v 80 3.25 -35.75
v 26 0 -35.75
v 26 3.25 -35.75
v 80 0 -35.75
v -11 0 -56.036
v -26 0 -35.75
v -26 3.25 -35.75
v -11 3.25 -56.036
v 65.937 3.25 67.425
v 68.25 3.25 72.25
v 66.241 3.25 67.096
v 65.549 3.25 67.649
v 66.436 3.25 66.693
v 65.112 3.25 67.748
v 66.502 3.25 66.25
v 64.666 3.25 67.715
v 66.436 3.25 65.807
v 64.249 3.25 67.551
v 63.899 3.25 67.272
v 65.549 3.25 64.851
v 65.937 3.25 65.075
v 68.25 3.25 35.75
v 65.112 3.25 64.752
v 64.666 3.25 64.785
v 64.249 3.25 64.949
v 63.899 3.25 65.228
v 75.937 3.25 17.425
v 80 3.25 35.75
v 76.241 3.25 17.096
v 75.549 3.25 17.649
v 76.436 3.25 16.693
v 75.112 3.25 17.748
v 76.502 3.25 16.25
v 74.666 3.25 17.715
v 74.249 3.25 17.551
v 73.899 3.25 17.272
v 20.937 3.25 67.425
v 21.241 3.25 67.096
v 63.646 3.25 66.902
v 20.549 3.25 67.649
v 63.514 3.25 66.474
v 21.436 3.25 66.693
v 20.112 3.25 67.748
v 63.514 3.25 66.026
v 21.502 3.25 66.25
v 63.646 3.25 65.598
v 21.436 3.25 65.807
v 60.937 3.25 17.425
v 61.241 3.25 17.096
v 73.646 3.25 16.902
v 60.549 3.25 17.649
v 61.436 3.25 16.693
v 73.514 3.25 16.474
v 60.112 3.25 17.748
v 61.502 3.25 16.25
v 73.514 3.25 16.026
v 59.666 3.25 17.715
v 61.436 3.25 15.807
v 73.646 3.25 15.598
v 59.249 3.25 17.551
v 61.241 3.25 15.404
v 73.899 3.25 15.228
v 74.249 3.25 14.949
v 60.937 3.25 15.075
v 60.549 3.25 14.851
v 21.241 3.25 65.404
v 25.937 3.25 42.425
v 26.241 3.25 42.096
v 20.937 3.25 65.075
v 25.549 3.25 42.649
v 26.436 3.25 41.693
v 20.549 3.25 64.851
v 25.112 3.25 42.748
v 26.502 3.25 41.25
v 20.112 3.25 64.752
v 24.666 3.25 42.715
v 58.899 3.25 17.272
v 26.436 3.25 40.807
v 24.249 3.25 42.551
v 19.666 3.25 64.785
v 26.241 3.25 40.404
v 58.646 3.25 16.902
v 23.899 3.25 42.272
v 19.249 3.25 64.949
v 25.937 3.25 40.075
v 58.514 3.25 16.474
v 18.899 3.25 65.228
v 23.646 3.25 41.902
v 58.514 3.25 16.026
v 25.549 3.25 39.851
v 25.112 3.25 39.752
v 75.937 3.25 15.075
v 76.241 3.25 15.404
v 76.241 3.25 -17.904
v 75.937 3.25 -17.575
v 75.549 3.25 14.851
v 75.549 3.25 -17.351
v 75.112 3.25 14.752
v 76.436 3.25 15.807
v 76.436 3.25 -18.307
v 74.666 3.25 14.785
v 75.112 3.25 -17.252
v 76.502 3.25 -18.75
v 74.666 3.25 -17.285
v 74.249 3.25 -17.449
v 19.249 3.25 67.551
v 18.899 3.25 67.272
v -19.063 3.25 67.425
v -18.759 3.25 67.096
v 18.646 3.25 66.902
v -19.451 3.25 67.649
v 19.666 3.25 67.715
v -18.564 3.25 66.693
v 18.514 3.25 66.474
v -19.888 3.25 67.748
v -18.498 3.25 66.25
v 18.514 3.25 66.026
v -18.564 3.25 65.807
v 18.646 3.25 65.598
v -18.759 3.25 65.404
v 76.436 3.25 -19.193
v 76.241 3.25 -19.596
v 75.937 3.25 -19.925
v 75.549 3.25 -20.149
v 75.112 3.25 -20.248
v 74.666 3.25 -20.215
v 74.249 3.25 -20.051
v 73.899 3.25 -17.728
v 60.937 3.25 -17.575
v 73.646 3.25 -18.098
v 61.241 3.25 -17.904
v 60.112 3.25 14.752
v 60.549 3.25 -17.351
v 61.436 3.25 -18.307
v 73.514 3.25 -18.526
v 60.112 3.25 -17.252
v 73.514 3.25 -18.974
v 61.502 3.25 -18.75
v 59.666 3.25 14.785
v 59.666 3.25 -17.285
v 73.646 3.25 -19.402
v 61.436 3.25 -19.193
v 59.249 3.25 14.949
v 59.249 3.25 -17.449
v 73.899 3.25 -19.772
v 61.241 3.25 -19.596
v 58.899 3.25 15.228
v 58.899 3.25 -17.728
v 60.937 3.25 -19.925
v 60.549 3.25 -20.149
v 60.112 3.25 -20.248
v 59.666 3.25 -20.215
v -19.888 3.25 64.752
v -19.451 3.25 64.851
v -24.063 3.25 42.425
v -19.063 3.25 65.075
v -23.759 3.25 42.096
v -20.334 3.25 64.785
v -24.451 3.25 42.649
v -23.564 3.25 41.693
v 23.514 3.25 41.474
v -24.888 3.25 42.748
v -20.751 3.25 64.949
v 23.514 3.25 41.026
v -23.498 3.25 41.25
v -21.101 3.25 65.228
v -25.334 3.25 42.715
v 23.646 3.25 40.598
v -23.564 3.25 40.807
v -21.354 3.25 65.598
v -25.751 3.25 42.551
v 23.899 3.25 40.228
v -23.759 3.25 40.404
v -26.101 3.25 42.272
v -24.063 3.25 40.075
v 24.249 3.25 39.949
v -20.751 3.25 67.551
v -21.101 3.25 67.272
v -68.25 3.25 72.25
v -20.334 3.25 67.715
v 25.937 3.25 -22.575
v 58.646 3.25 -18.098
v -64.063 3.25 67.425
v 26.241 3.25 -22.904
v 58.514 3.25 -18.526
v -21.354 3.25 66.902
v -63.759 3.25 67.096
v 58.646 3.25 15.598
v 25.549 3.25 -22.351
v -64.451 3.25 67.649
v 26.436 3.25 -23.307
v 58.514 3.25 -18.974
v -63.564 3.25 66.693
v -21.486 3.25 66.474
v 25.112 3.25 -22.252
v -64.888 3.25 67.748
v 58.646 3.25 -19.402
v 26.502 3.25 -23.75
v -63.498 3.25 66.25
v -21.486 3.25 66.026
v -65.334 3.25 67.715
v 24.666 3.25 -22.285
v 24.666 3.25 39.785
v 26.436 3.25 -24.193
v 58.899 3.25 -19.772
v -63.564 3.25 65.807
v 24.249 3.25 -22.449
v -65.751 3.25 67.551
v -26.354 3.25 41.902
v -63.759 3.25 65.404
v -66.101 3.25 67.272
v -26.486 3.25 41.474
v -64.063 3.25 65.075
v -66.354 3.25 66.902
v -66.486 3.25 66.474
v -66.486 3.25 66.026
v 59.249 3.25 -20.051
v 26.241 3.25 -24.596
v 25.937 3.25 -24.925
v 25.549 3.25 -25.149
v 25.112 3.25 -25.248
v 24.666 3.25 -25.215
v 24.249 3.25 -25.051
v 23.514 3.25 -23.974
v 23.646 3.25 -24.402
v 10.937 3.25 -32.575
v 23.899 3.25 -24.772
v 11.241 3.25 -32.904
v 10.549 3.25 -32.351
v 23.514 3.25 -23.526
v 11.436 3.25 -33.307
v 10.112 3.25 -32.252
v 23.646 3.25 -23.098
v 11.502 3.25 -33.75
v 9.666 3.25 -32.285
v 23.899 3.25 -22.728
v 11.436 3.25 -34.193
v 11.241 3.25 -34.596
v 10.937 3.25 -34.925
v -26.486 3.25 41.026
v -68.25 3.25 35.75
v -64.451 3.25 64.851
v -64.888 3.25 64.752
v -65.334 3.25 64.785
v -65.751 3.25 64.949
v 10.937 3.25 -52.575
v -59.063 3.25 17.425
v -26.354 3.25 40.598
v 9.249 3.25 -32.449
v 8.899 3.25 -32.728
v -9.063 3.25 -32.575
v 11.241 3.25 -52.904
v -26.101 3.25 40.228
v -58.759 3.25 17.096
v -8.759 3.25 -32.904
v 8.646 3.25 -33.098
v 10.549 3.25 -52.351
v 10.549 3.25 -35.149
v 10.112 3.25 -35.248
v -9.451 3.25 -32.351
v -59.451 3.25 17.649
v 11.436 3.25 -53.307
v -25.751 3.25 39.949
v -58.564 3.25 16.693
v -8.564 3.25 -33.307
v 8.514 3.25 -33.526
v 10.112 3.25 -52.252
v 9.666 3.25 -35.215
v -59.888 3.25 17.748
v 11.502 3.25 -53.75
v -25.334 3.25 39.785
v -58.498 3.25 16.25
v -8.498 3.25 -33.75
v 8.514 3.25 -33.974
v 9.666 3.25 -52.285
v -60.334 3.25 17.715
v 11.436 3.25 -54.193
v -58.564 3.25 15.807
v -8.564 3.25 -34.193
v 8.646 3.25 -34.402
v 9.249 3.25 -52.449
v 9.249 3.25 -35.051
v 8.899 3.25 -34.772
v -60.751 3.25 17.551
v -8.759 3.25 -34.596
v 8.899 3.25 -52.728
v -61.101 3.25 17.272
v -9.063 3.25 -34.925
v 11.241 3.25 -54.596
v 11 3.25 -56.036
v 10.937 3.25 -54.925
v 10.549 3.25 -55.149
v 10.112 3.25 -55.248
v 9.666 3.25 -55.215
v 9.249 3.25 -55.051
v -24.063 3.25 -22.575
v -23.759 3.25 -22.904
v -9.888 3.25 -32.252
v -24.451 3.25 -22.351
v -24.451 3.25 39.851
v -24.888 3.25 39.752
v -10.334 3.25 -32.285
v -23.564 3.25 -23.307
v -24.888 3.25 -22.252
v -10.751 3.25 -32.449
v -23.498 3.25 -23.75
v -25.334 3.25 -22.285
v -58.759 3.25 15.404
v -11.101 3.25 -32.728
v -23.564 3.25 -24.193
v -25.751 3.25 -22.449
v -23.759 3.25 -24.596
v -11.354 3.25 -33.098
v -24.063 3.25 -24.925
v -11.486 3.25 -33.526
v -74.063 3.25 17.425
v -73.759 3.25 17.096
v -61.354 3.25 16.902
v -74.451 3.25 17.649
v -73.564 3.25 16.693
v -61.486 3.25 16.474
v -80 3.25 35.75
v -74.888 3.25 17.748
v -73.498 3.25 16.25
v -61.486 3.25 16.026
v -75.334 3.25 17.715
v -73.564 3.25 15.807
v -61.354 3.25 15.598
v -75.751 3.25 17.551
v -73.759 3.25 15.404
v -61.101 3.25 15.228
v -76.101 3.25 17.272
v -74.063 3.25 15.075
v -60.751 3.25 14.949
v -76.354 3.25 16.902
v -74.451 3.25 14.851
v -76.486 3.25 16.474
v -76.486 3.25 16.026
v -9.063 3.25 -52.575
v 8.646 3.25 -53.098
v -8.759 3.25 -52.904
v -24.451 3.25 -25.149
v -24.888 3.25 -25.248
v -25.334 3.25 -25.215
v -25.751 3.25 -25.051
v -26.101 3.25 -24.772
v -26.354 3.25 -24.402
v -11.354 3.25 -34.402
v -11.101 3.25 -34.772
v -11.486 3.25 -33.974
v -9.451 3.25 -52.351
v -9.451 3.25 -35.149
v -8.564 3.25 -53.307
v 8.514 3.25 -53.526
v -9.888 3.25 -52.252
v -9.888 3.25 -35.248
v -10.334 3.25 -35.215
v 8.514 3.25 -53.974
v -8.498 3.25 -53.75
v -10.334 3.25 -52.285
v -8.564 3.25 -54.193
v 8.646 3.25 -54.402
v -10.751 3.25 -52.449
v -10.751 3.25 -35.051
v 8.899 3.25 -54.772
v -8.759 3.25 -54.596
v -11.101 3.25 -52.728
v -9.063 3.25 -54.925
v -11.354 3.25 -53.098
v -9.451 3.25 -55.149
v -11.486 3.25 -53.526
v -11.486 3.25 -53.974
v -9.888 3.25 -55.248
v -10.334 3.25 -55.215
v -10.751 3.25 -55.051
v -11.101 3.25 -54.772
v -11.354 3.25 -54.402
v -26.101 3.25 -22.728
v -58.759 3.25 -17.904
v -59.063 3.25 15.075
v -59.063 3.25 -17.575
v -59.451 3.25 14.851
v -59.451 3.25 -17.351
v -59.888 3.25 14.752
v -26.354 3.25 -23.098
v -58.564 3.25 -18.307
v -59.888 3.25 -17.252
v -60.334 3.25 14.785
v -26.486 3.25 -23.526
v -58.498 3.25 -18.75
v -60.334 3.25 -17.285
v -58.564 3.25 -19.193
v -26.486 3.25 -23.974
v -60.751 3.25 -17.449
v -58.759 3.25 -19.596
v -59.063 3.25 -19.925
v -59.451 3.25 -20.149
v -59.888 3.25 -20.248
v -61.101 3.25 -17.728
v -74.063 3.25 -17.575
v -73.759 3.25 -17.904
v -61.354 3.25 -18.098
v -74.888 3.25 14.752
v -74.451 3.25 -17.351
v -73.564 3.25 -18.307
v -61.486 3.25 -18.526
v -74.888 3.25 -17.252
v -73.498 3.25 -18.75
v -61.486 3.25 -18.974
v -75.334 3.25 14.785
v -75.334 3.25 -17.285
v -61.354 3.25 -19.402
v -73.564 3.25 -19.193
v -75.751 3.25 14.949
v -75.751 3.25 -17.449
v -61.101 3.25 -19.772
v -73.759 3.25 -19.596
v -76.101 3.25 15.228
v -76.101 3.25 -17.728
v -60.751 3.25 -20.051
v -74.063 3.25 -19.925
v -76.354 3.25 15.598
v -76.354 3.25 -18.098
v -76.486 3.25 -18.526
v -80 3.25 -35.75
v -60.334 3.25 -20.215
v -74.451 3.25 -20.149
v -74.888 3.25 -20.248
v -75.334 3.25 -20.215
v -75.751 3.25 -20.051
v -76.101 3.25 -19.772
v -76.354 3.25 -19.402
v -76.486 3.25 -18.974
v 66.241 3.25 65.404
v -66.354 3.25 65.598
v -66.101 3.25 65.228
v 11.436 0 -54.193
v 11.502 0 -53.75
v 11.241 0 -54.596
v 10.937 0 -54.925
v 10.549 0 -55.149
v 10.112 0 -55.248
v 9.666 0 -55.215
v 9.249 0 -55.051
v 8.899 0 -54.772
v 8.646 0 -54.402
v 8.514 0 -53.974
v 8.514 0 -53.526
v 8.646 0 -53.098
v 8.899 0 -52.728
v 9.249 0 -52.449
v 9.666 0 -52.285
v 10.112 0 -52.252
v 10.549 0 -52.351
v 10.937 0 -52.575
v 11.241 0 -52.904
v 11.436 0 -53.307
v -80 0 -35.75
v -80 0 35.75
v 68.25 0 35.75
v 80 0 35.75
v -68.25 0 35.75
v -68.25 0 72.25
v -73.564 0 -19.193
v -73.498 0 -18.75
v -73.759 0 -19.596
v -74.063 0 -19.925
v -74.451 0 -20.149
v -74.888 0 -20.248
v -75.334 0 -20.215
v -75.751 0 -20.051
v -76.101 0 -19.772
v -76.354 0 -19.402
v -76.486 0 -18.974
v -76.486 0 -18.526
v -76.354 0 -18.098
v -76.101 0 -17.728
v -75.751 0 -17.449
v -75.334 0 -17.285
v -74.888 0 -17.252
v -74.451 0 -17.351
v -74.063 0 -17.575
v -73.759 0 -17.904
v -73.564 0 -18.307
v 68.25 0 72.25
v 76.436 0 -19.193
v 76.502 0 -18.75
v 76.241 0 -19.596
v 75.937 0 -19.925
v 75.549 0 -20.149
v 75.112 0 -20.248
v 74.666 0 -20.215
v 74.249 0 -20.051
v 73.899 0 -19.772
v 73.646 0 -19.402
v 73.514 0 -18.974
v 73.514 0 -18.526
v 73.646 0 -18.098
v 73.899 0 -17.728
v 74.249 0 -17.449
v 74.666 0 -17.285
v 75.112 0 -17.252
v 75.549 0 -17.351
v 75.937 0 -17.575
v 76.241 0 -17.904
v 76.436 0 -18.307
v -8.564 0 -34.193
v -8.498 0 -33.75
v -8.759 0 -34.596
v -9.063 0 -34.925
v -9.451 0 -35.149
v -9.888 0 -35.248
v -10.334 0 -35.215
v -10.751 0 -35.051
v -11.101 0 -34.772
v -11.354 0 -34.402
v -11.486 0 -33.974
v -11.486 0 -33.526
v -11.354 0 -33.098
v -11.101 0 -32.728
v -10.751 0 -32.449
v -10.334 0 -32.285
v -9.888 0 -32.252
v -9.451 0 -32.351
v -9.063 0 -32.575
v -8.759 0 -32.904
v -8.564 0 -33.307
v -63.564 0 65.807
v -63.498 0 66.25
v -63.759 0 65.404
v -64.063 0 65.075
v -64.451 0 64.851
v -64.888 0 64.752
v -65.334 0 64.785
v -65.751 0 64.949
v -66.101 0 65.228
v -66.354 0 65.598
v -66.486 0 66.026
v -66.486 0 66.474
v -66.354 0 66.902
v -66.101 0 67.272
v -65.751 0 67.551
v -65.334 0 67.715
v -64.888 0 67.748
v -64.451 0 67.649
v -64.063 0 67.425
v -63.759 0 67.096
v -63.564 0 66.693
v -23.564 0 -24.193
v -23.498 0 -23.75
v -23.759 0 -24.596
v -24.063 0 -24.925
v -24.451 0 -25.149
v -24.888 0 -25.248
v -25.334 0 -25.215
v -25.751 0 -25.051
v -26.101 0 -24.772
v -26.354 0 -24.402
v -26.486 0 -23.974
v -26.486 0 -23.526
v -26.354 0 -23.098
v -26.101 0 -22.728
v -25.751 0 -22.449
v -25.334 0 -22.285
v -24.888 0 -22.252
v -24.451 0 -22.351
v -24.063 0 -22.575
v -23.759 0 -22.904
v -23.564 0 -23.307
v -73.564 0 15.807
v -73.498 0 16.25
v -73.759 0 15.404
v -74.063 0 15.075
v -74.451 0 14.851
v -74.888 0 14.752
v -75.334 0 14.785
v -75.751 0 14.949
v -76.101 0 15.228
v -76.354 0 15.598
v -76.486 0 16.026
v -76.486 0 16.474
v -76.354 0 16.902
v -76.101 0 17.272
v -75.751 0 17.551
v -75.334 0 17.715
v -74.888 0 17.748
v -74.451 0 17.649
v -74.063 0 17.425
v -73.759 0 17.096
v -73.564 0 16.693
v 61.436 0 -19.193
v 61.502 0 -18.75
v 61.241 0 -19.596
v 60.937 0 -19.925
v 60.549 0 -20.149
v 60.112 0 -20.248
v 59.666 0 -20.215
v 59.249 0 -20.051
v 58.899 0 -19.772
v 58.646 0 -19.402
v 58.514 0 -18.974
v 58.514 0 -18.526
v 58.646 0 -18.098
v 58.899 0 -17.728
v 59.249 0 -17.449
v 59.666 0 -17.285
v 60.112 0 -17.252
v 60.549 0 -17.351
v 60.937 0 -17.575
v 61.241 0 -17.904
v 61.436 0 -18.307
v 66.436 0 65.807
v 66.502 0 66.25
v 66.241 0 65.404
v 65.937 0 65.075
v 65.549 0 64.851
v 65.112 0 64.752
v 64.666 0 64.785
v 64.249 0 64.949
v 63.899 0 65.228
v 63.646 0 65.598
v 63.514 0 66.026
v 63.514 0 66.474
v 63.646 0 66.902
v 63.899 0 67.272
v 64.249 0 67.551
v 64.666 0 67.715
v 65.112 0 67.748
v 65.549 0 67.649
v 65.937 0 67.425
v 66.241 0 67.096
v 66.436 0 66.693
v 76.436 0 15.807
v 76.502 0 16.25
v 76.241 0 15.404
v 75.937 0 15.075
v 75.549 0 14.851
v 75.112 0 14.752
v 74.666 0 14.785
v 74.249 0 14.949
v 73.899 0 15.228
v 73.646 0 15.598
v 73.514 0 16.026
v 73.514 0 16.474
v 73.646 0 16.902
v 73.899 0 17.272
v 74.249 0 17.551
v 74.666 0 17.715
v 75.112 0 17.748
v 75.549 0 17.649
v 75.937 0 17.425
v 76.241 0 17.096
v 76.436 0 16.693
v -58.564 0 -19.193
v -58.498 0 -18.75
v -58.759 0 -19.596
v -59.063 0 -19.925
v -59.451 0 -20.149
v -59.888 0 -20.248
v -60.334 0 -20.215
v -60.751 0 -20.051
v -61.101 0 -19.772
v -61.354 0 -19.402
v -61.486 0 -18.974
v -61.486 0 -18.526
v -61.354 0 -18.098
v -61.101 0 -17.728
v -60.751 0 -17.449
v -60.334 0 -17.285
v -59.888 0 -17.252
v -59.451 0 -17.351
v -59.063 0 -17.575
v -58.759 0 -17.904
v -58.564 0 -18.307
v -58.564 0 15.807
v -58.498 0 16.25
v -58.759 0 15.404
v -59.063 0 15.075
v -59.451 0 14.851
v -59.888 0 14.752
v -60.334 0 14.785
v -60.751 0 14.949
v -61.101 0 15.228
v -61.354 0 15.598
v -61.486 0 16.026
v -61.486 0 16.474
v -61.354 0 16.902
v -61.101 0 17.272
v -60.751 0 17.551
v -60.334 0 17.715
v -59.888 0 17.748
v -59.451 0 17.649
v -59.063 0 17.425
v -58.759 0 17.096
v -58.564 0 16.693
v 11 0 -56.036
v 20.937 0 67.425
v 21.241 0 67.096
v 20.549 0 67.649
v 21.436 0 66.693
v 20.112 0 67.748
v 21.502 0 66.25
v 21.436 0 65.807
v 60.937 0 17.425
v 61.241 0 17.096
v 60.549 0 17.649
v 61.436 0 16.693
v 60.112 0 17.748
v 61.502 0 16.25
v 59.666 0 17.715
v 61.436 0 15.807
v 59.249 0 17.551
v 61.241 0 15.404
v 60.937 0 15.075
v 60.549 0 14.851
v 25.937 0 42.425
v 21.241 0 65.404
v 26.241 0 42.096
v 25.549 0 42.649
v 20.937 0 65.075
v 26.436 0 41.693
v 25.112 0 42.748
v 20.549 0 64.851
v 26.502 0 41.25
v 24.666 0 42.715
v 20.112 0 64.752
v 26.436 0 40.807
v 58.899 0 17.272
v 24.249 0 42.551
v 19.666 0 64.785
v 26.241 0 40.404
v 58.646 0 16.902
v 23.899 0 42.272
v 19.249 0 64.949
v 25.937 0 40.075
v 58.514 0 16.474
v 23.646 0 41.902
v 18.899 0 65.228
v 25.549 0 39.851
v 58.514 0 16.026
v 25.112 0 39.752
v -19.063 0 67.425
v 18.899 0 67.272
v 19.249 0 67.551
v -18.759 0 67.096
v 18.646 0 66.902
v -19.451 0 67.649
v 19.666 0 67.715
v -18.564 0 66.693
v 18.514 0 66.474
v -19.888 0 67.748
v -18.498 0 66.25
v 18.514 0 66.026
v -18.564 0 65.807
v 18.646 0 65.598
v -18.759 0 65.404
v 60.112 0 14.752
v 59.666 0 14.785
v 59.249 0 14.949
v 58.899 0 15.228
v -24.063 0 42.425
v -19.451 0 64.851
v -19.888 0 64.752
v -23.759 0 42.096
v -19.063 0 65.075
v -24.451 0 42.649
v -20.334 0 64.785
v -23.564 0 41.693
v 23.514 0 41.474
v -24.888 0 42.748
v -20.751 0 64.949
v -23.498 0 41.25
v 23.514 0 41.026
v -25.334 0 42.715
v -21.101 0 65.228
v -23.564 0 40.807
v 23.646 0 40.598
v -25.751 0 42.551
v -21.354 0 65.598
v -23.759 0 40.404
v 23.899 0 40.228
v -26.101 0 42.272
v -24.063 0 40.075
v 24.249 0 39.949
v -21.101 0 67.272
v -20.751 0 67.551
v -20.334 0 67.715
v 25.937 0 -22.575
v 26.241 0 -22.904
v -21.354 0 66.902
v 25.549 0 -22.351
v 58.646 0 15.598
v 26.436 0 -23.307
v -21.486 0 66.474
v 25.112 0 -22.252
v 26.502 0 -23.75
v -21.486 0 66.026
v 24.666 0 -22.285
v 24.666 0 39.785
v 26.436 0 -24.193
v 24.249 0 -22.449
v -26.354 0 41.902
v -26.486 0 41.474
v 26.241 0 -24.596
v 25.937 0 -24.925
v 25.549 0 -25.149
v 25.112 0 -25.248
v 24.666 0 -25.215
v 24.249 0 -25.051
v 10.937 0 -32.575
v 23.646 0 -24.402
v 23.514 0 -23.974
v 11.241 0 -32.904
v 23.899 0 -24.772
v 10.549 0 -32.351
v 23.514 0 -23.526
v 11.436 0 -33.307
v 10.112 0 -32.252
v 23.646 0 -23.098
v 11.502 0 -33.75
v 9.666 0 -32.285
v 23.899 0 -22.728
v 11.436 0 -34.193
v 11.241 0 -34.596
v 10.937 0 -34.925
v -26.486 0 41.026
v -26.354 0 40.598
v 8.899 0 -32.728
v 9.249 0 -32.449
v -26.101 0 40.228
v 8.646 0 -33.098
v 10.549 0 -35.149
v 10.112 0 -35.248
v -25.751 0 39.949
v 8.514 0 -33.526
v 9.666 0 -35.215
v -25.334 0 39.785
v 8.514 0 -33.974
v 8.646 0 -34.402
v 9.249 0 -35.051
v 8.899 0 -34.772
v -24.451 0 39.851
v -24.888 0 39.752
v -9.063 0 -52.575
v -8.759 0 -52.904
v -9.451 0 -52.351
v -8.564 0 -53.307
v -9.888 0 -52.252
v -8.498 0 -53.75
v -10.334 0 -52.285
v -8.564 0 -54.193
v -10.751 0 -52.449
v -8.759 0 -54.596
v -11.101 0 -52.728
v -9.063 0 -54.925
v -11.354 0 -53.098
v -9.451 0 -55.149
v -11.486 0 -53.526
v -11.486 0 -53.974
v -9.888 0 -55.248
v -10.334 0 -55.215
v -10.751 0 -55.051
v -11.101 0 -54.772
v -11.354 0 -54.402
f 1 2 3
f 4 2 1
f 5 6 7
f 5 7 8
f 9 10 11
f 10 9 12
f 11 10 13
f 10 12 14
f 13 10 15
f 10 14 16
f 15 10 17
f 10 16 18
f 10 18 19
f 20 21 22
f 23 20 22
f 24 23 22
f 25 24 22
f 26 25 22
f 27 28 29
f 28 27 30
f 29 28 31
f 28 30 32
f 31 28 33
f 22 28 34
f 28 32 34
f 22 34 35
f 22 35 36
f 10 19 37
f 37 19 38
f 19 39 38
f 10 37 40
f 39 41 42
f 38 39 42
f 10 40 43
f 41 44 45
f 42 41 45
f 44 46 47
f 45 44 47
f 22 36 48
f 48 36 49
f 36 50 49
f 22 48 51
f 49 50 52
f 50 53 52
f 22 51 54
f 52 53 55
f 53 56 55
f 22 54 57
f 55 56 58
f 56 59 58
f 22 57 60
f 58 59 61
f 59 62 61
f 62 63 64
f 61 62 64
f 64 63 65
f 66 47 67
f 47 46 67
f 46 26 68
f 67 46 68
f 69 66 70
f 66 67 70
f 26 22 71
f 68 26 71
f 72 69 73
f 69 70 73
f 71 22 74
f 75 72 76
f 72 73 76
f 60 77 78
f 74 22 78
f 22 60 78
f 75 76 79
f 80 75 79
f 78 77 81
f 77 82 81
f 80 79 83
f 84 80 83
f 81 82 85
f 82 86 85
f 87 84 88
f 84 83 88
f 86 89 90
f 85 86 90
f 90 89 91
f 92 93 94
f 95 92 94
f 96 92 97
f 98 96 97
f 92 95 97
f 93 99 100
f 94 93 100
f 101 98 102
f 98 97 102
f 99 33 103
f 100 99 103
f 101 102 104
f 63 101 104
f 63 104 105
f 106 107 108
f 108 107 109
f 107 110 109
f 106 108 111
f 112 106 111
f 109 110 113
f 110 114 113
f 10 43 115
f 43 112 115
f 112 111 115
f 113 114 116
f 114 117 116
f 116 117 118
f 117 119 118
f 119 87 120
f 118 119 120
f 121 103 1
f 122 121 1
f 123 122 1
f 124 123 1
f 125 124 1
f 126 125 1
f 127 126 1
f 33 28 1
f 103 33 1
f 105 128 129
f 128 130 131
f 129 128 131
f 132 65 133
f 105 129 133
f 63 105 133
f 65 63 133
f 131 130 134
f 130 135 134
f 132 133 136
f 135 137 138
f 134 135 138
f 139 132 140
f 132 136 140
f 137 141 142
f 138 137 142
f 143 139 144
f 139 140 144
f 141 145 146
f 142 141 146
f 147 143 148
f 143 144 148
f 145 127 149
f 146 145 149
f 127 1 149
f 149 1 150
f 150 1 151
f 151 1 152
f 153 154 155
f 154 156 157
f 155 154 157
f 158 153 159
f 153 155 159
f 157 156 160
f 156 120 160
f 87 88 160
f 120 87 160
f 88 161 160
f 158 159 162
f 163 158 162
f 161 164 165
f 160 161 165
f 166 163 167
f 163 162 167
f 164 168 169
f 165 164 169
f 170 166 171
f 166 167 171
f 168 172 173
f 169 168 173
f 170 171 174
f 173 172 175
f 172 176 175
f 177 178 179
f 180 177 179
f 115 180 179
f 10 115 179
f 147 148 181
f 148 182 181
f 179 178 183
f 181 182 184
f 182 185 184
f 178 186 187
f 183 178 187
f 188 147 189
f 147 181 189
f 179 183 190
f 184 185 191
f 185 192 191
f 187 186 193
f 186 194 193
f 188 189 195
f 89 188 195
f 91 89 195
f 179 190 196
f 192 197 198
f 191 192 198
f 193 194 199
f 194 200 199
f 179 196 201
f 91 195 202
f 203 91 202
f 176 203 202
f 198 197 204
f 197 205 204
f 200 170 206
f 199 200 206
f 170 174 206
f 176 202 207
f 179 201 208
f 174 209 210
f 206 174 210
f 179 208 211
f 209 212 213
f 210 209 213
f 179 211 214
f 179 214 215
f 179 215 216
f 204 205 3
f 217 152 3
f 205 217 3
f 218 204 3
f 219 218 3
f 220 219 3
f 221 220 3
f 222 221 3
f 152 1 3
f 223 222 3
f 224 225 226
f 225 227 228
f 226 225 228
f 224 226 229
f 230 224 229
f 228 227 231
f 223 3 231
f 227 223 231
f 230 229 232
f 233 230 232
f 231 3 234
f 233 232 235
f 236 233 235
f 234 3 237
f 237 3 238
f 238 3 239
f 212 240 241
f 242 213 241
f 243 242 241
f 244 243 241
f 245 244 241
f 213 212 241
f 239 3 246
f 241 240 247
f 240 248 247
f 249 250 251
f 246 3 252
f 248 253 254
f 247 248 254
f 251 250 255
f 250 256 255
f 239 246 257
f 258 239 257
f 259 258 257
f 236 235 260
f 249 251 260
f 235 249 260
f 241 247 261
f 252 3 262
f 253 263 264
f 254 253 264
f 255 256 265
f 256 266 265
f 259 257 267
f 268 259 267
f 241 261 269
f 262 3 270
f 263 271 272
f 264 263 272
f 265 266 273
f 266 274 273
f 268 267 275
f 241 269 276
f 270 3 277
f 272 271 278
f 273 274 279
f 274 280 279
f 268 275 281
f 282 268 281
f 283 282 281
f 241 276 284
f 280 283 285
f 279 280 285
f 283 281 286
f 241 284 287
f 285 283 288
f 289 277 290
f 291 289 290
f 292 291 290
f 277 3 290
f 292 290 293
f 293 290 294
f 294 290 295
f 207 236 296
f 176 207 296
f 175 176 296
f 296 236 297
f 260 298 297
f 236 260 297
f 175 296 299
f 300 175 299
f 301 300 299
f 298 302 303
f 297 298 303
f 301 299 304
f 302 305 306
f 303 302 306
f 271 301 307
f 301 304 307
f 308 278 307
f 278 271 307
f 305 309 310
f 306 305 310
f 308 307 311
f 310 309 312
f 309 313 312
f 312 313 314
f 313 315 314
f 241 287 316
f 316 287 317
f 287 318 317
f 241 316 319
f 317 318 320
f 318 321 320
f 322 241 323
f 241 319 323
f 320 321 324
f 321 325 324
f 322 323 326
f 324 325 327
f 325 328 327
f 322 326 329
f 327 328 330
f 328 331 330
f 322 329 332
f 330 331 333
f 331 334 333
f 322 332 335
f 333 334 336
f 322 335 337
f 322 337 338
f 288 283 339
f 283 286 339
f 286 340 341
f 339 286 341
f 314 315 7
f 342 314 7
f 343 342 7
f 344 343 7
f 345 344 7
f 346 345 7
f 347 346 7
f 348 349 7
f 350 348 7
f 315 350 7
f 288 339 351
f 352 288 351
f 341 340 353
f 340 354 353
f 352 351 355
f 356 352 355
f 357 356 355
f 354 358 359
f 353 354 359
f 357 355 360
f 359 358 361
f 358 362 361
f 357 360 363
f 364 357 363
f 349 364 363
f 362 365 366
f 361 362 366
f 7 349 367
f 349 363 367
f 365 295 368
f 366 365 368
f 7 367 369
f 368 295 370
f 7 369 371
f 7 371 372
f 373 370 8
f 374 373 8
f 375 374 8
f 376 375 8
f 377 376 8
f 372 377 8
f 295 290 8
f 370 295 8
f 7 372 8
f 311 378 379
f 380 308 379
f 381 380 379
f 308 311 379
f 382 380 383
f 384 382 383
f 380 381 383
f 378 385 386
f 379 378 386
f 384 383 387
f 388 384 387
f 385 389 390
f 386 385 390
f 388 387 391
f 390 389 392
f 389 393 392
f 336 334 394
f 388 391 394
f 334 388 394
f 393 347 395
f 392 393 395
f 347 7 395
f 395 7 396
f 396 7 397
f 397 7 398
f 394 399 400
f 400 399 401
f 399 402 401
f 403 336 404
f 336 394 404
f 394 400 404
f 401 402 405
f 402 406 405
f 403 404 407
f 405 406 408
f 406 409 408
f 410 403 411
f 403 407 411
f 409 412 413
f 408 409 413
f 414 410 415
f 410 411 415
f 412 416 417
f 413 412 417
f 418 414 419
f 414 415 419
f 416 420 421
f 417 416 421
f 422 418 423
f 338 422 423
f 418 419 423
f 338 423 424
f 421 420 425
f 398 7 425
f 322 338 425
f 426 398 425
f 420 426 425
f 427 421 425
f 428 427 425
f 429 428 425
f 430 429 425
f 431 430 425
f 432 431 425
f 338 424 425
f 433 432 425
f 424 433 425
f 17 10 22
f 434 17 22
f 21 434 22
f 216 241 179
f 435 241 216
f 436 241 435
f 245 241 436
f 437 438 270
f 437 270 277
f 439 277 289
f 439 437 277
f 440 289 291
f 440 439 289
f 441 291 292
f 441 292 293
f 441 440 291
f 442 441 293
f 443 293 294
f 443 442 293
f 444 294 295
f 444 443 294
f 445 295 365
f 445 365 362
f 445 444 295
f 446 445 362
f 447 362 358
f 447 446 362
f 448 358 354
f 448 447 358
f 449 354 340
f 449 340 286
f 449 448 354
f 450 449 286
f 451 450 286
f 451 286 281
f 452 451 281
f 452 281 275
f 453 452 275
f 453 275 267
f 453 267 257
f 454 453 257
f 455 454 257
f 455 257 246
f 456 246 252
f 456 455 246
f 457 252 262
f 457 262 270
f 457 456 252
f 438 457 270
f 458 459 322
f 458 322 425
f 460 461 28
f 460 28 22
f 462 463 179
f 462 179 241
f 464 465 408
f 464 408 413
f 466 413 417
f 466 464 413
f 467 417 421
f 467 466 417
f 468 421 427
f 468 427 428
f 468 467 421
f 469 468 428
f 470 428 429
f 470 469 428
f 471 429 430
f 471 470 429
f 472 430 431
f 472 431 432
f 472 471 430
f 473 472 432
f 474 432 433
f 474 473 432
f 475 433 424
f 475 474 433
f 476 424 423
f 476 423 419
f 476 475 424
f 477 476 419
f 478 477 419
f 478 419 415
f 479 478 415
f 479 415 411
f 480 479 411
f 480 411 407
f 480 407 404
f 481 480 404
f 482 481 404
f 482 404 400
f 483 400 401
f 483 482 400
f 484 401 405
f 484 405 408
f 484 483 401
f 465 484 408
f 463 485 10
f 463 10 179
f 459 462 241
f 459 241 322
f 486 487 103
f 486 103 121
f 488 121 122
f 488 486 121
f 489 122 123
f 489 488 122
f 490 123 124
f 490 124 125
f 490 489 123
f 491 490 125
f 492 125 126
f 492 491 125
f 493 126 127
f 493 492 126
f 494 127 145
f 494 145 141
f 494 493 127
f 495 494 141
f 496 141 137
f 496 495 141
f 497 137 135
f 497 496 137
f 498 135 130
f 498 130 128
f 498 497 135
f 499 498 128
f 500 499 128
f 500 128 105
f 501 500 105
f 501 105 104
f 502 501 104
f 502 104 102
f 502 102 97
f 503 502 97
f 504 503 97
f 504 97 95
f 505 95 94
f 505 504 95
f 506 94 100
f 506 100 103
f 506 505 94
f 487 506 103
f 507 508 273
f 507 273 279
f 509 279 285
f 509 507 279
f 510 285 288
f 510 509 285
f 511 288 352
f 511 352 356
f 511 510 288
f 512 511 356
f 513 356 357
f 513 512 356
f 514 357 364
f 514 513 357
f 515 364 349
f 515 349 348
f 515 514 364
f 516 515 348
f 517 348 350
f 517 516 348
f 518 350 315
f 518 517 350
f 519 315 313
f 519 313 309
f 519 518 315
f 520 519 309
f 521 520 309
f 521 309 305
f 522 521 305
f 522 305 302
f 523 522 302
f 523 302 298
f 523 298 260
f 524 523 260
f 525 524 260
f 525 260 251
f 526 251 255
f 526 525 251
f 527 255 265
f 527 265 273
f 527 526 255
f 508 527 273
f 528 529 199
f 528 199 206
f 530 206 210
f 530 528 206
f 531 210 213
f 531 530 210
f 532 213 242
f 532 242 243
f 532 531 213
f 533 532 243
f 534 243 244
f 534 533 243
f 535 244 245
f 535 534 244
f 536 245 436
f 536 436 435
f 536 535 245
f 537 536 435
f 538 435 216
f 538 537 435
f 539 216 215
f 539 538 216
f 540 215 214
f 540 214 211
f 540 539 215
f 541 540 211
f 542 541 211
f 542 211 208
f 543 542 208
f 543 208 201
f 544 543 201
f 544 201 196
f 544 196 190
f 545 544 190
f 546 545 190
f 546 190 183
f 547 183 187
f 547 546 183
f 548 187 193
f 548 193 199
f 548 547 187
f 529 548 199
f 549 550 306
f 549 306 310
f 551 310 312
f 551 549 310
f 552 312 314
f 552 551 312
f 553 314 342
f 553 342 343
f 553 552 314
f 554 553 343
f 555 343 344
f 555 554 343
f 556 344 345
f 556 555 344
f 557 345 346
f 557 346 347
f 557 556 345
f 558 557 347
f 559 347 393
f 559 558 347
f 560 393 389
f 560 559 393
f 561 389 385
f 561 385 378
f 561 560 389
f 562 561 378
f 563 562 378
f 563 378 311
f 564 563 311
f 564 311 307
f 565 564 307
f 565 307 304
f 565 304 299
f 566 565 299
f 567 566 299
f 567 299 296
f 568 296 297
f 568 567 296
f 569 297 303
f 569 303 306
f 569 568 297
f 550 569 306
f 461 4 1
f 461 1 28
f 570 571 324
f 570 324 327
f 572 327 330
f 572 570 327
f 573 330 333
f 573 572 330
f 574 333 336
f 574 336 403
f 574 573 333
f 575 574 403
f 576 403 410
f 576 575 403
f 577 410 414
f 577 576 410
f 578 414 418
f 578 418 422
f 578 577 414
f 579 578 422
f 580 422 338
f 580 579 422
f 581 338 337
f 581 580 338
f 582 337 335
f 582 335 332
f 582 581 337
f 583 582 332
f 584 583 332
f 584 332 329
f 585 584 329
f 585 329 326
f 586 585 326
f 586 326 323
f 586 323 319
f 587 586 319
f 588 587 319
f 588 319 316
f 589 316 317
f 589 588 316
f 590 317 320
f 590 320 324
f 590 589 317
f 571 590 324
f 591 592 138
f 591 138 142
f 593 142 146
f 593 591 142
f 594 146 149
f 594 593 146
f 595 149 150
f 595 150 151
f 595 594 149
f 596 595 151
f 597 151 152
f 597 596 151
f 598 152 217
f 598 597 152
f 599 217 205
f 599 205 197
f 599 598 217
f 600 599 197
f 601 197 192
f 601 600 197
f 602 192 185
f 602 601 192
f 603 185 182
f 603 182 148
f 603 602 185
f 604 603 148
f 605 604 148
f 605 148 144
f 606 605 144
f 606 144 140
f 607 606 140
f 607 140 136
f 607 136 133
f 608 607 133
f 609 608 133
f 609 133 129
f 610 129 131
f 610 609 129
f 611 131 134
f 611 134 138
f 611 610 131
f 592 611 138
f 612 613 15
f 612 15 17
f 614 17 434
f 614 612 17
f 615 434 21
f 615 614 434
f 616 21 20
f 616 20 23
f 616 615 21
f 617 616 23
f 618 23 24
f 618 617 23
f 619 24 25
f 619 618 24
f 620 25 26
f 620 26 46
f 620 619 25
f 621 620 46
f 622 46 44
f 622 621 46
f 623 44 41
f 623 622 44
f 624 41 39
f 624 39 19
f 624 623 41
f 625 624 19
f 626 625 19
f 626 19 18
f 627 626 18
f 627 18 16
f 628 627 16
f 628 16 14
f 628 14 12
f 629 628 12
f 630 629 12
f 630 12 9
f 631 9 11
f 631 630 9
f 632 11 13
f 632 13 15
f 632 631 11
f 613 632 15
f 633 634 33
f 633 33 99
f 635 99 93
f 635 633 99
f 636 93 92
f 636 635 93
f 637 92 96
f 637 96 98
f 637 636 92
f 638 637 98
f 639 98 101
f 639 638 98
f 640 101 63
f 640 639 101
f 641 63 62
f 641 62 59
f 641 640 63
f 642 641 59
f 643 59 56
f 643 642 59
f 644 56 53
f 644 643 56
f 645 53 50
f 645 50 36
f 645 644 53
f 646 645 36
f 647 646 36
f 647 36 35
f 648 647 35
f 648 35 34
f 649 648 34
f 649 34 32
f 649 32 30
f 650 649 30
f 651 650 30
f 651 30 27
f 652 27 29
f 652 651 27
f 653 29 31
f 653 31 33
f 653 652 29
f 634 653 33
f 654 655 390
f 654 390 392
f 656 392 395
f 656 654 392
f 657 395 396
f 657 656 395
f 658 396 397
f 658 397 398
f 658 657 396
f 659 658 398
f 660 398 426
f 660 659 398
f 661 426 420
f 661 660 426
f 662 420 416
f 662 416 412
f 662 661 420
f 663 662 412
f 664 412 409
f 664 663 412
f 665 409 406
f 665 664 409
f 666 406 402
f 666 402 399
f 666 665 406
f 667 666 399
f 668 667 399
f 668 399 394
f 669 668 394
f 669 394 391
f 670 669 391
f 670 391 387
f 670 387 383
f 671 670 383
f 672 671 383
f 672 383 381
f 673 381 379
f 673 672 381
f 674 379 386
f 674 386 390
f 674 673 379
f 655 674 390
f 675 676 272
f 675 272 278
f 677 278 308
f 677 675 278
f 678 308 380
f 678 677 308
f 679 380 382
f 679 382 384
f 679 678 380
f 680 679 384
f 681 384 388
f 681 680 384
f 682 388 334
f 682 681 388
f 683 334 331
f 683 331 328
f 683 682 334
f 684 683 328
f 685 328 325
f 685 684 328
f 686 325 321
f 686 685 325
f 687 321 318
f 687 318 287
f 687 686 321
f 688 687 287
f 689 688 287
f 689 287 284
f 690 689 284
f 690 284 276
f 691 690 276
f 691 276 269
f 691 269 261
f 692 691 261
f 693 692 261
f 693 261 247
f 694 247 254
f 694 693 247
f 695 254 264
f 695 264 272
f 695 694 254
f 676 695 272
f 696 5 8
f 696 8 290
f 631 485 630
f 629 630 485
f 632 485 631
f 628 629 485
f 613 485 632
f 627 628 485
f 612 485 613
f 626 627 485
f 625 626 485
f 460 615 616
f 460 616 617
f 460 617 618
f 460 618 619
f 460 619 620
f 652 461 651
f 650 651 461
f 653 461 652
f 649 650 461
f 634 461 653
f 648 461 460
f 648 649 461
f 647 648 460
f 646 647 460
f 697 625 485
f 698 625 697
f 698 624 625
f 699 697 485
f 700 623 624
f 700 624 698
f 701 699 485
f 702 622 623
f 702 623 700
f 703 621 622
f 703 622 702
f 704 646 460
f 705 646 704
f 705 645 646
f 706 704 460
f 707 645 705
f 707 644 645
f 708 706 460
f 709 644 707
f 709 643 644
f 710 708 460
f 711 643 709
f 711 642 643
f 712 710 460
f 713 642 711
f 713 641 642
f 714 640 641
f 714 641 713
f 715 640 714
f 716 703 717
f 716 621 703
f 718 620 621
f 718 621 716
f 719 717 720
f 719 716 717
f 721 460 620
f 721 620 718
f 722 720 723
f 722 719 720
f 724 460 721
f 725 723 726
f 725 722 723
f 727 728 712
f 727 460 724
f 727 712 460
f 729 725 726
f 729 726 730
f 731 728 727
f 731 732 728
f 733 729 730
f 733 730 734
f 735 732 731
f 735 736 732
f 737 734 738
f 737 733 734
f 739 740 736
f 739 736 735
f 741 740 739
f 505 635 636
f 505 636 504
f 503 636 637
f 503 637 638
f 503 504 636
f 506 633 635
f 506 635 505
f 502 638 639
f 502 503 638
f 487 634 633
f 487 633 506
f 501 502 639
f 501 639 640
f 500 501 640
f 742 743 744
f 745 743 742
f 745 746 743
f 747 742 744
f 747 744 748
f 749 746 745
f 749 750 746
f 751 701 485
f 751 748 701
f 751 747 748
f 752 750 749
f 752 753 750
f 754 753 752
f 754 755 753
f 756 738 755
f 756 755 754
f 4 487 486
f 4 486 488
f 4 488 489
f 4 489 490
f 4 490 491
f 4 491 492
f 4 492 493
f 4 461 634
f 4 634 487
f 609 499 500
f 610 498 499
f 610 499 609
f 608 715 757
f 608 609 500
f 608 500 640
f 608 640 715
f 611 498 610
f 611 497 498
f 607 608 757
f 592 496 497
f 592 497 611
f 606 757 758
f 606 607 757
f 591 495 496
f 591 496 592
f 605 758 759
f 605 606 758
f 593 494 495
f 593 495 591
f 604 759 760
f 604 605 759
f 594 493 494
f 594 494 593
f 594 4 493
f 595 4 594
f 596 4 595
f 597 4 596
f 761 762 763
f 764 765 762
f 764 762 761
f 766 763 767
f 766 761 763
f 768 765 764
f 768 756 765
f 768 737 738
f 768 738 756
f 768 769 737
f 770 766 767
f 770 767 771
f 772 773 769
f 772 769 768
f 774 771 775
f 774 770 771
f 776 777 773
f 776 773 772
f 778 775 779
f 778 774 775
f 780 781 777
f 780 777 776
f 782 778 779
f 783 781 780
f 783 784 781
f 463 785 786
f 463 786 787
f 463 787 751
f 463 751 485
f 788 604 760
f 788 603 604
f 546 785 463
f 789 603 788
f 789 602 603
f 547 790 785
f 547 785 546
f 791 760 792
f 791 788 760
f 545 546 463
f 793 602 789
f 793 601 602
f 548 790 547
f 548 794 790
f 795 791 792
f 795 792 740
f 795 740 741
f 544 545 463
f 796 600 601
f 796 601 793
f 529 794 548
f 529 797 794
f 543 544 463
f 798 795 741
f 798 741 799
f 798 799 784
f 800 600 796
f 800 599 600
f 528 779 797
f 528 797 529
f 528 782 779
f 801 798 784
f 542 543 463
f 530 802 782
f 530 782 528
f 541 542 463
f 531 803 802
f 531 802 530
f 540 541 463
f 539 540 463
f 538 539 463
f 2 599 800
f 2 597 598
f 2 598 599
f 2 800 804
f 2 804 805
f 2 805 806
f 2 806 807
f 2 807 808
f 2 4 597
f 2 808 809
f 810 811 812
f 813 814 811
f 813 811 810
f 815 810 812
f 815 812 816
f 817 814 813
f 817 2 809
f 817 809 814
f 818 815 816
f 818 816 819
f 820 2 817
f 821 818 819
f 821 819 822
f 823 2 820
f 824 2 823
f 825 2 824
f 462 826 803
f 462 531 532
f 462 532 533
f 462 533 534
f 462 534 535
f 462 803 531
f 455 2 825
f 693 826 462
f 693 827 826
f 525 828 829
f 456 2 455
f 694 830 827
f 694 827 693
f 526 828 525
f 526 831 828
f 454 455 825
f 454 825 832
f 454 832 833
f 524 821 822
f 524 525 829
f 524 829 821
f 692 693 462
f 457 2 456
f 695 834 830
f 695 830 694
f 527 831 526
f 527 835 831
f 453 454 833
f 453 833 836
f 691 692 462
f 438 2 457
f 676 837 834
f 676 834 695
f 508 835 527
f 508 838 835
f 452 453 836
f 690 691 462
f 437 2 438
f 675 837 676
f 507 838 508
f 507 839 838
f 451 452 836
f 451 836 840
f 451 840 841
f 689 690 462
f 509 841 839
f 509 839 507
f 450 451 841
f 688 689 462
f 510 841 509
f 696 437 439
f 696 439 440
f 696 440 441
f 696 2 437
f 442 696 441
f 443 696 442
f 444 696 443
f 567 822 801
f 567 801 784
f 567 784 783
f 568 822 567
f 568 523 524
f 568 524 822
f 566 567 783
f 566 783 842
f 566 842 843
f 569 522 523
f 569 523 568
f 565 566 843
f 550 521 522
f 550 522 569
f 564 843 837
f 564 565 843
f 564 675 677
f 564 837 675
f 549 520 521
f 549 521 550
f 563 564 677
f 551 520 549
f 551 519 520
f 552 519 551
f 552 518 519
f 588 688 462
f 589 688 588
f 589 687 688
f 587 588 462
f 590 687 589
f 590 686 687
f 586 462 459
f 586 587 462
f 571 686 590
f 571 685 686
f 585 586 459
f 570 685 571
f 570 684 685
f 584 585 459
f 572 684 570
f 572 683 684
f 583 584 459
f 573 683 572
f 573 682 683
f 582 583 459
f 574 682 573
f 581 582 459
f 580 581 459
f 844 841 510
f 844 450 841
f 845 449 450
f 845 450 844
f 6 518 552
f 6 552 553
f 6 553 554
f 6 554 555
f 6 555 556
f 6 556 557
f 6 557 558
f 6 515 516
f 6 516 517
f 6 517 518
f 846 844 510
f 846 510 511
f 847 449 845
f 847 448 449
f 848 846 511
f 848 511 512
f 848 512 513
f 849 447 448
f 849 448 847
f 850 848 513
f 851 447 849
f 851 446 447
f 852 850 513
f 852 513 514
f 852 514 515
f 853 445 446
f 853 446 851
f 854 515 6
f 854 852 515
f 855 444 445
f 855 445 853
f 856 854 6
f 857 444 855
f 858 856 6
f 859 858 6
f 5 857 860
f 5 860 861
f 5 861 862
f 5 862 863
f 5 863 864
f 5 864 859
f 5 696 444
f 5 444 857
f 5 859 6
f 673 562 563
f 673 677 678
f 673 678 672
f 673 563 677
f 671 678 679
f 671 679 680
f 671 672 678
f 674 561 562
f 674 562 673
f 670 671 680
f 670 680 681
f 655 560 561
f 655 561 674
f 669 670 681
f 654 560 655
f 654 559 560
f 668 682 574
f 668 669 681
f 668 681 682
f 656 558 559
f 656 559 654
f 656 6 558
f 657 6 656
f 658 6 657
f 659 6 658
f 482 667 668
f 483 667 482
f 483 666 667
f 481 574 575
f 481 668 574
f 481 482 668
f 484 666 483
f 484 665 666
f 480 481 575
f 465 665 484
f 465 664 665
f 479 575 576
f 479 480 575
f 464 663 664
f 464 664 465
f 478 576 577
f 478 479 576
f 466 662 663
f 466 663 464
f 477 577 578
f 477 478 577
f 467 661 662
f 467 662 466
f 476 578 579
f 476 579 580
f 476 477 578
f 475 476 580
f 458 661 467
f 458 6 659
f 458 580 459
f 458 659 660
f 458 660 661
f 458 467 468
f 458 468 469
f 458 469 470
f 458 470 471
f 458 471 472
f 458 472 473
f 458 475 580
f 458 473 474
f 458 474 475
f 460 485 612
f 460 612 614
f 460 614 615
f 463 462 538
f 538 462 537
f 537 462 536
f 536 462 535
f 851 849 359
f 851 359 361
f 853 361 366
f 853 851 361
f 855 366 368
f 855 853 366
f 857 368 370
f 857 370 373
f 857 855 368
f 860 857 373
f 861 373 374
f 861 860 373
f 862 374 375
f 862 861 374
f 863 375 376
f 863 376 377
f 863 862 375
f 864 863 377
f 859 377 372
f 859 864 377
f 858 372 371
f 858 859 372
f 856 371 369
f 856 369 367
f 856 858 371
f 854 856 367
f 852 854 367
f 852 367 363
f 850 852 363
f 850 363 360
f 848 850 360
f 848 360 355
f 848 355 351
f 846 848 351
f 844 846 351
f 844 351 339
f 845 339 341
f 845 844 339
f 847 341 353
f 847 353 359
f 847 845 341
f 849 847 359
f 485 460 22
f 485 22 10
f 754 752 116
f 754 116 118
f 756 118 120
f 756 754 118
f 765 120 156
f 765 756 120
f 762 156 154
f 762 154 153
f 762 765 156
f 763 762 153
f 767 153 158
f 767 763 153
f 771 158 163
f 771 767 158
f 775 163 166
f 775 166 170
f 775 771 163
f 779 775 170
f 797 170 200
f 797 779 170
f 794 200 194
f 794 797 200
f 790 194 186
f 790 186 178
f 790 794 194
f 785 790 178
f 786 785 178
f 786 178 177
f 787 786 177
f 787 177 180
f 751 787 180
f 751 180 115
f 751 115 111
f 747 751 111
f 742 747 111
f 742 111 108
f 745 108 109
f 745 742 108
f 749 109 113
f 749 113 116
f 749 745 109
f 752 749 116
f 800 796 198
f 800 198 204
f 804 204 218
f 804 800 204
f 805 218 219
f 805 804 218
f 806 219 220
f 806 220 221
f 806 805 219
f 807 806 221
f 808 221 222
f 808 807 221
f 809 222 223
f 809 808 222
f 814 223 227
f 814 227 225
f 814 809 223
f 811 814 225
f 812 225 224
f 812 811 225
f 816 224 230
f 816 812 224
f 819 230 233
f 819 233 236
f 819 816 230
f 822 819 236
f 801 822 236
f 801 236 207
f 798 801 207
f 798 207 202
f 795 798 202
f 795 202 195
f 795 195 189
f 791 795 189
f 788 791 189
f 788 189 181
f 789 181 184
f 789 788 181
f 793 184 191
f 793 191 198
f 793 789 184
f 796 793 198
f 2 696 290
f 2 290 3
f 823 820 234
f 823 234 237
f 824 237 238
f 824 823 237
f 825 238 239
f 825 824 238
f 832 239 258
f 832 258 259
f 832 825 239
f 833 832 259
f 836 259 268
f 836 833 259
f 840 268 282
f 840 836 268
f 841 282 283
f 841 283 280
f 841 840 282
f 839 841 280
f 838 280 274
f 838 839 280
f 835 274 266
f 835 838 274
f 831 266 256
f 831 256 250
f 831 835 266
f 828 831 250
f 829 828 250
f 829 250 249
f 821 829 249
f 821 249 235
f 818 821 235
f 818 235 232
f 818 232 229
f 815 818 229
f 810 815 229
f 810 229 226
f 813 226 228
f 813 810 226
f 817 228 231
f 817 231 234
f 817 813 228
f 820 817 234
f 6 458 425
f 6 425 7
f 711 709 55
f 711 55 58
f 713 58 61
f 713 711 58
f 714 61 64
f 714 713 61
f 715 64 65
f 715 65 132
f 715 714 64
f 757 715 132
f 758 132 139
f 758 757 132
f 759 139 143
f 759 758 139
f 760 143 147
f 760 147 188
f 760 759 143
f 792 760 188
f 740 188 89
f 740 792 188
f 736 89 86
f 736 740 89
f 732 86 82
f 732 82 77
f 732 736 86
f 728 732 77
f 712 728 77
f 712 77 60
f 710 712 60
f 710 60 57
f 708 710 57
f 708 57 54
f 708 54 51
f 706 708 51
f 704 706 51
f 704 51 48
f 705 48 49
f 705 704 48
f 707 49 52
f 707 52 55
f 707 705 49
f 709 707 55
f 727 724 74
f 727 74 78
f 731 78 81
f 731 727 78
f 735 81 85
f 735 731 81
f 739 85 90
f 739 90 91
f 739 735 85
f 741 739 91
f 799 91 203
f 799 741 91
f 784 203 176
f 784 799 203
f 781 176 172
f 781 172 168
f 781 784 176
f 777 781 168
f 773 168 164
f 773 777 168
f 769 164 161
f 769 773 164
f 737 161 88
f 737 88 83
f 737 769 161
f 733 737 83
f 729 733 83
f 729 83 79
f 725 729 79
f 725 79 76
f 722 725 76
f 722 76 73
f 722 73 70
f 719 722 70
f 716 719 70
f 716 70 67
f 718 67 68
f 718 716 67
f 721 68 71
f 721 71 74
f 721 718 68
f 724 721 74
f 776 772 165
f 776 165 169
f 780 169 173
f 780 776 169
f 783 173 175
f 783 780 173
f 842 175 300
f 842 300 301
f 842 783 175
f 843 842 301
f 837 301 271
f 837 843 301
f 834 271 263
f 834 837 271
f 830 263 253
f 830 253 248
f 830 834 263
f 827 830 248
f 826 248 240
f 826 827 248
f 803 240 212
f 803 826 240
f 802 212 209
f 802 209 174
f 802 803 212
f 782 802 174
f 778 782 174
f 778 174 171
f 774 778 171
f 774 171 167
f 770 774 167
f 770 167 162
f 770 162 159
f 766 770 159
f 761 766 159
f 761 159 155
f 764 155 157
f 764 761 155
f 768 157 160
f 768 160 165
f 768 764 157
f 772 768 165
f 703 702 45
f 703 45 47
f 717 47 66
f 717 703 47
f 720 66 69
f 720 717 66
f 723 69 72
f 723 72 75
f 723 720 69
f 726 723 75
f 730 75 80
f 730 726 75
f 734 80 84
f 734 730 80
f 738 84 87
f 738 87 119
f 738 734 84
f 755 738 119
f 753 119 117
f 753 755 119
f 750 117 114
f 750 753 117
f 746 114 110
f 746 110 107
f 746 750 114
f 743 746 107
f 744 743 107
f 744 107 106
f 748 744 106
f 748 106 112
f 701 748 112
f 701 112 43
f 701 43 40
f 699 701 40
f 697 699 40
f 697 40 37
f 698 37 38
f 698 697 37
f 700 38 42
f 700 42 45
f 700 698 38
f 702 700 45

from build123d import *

# Parameters (mm, degrees)
SKETCH1_R           = 1.5025
BOSS_EXTRUDE1_DEPTH = 3.25


with BuildPart() as part:
    # Sketch1 → Boss-Extrude1 (new body)
    with BuildSketch(Plane(origin=(0, 0, 0), x_dir=(1, 0, 0), z_dir=(0, 1, 0))):
        Polygon((-11, 56.036176716), (11, 56.036176716), (26, 35.75), (80, 35.75), (80, -35.75), (68.25, -35.75), (68.25, -72.25), (-68.25, -72.25), (-68.25, -35.75), (-80, -35.75), (-80, 35.75), (-26, 35.75), align=None)
        with Locations((-10, 33.75)):
            Circle(SKETCH1_R, mode=Mode.SUBTRACT)
        with Locations((10, 33.75)):
            Circle(SKETCH1_R, mode=Mode.SUBTRACT)
        with Locations((-10, 53.75)):
            Circle(SKETCH1_R, mode=Mode.SUBTRACT)
        with Locations((10, 53.75)):
            Circle(SKETCH1_R, mode=Mode.SUBTRACT)
        with Locations((-25, 23.75)):
            Circle(SKETCH1_R, mode=Mode.SUBTRACT)
        with Locations((25, 23.75)):
            Circle(SKETCH1_R, mode=Mode.SUBTRACT)
        with Locations((-60, 18.75)):
            Circle(SKETCH1_R, mode=Mode.SUBTRACT)
        with Locations((60, 18.75)):
            Circle(SKETCH1_R, mode=Mode.SUBTRACT)
        with Locations((75, 18.75)):
            Circle(SKETCH1_R, mode=Mode.SUBTRACT)
        with Locations((-60, -16.25)):
            Circle(SKETCH1_R, mode=Mode.SUBTRACT)
        with Locations((60, -16.25)):
            Circle(SKETCH1_R, mode=Mode.SUBTRACT)
        with Locations((75, -16.25)):
            Circle(SKETCH1_R, mode=Mode.SUBTRACT)
        with Locations((-25, -41.25)):
            Circle(SKETCH1_R, mode=Mode.SUBTRACT)
        with Locations((25, -41.25)):
            Circle(SKETCH1_R, mode=Mode.SUBTRACT)
        with Locations((-65, -66.25)):
            Circle(SKETCH1_R, mode=Mode.SUBTRACT)
        with Locations((-20, -66.25)):
            Circle(SKETCH1_R, mode=Mode.SUBTRACT)
        with Locations((20, -66.25)):
            Circle(SKETCH1_R, mode=Mode.SUBTRACT)
        with Locations((65, -66.25)):
            Circle(SKETCH1_R, mode=Mode.SUBTRACT)
        with Locations((-75, 18.75)):
            Circle(SKETCH1_R, mode=Mode.SUBTRACT)
        with Locations((-75, -16.25)):
            Circle(SKETCH1_R, mode=Mode.SUBTRACT)
    extrude(amount=BOSS_EXTRUDE1_DEPTH)


solid = part.part
